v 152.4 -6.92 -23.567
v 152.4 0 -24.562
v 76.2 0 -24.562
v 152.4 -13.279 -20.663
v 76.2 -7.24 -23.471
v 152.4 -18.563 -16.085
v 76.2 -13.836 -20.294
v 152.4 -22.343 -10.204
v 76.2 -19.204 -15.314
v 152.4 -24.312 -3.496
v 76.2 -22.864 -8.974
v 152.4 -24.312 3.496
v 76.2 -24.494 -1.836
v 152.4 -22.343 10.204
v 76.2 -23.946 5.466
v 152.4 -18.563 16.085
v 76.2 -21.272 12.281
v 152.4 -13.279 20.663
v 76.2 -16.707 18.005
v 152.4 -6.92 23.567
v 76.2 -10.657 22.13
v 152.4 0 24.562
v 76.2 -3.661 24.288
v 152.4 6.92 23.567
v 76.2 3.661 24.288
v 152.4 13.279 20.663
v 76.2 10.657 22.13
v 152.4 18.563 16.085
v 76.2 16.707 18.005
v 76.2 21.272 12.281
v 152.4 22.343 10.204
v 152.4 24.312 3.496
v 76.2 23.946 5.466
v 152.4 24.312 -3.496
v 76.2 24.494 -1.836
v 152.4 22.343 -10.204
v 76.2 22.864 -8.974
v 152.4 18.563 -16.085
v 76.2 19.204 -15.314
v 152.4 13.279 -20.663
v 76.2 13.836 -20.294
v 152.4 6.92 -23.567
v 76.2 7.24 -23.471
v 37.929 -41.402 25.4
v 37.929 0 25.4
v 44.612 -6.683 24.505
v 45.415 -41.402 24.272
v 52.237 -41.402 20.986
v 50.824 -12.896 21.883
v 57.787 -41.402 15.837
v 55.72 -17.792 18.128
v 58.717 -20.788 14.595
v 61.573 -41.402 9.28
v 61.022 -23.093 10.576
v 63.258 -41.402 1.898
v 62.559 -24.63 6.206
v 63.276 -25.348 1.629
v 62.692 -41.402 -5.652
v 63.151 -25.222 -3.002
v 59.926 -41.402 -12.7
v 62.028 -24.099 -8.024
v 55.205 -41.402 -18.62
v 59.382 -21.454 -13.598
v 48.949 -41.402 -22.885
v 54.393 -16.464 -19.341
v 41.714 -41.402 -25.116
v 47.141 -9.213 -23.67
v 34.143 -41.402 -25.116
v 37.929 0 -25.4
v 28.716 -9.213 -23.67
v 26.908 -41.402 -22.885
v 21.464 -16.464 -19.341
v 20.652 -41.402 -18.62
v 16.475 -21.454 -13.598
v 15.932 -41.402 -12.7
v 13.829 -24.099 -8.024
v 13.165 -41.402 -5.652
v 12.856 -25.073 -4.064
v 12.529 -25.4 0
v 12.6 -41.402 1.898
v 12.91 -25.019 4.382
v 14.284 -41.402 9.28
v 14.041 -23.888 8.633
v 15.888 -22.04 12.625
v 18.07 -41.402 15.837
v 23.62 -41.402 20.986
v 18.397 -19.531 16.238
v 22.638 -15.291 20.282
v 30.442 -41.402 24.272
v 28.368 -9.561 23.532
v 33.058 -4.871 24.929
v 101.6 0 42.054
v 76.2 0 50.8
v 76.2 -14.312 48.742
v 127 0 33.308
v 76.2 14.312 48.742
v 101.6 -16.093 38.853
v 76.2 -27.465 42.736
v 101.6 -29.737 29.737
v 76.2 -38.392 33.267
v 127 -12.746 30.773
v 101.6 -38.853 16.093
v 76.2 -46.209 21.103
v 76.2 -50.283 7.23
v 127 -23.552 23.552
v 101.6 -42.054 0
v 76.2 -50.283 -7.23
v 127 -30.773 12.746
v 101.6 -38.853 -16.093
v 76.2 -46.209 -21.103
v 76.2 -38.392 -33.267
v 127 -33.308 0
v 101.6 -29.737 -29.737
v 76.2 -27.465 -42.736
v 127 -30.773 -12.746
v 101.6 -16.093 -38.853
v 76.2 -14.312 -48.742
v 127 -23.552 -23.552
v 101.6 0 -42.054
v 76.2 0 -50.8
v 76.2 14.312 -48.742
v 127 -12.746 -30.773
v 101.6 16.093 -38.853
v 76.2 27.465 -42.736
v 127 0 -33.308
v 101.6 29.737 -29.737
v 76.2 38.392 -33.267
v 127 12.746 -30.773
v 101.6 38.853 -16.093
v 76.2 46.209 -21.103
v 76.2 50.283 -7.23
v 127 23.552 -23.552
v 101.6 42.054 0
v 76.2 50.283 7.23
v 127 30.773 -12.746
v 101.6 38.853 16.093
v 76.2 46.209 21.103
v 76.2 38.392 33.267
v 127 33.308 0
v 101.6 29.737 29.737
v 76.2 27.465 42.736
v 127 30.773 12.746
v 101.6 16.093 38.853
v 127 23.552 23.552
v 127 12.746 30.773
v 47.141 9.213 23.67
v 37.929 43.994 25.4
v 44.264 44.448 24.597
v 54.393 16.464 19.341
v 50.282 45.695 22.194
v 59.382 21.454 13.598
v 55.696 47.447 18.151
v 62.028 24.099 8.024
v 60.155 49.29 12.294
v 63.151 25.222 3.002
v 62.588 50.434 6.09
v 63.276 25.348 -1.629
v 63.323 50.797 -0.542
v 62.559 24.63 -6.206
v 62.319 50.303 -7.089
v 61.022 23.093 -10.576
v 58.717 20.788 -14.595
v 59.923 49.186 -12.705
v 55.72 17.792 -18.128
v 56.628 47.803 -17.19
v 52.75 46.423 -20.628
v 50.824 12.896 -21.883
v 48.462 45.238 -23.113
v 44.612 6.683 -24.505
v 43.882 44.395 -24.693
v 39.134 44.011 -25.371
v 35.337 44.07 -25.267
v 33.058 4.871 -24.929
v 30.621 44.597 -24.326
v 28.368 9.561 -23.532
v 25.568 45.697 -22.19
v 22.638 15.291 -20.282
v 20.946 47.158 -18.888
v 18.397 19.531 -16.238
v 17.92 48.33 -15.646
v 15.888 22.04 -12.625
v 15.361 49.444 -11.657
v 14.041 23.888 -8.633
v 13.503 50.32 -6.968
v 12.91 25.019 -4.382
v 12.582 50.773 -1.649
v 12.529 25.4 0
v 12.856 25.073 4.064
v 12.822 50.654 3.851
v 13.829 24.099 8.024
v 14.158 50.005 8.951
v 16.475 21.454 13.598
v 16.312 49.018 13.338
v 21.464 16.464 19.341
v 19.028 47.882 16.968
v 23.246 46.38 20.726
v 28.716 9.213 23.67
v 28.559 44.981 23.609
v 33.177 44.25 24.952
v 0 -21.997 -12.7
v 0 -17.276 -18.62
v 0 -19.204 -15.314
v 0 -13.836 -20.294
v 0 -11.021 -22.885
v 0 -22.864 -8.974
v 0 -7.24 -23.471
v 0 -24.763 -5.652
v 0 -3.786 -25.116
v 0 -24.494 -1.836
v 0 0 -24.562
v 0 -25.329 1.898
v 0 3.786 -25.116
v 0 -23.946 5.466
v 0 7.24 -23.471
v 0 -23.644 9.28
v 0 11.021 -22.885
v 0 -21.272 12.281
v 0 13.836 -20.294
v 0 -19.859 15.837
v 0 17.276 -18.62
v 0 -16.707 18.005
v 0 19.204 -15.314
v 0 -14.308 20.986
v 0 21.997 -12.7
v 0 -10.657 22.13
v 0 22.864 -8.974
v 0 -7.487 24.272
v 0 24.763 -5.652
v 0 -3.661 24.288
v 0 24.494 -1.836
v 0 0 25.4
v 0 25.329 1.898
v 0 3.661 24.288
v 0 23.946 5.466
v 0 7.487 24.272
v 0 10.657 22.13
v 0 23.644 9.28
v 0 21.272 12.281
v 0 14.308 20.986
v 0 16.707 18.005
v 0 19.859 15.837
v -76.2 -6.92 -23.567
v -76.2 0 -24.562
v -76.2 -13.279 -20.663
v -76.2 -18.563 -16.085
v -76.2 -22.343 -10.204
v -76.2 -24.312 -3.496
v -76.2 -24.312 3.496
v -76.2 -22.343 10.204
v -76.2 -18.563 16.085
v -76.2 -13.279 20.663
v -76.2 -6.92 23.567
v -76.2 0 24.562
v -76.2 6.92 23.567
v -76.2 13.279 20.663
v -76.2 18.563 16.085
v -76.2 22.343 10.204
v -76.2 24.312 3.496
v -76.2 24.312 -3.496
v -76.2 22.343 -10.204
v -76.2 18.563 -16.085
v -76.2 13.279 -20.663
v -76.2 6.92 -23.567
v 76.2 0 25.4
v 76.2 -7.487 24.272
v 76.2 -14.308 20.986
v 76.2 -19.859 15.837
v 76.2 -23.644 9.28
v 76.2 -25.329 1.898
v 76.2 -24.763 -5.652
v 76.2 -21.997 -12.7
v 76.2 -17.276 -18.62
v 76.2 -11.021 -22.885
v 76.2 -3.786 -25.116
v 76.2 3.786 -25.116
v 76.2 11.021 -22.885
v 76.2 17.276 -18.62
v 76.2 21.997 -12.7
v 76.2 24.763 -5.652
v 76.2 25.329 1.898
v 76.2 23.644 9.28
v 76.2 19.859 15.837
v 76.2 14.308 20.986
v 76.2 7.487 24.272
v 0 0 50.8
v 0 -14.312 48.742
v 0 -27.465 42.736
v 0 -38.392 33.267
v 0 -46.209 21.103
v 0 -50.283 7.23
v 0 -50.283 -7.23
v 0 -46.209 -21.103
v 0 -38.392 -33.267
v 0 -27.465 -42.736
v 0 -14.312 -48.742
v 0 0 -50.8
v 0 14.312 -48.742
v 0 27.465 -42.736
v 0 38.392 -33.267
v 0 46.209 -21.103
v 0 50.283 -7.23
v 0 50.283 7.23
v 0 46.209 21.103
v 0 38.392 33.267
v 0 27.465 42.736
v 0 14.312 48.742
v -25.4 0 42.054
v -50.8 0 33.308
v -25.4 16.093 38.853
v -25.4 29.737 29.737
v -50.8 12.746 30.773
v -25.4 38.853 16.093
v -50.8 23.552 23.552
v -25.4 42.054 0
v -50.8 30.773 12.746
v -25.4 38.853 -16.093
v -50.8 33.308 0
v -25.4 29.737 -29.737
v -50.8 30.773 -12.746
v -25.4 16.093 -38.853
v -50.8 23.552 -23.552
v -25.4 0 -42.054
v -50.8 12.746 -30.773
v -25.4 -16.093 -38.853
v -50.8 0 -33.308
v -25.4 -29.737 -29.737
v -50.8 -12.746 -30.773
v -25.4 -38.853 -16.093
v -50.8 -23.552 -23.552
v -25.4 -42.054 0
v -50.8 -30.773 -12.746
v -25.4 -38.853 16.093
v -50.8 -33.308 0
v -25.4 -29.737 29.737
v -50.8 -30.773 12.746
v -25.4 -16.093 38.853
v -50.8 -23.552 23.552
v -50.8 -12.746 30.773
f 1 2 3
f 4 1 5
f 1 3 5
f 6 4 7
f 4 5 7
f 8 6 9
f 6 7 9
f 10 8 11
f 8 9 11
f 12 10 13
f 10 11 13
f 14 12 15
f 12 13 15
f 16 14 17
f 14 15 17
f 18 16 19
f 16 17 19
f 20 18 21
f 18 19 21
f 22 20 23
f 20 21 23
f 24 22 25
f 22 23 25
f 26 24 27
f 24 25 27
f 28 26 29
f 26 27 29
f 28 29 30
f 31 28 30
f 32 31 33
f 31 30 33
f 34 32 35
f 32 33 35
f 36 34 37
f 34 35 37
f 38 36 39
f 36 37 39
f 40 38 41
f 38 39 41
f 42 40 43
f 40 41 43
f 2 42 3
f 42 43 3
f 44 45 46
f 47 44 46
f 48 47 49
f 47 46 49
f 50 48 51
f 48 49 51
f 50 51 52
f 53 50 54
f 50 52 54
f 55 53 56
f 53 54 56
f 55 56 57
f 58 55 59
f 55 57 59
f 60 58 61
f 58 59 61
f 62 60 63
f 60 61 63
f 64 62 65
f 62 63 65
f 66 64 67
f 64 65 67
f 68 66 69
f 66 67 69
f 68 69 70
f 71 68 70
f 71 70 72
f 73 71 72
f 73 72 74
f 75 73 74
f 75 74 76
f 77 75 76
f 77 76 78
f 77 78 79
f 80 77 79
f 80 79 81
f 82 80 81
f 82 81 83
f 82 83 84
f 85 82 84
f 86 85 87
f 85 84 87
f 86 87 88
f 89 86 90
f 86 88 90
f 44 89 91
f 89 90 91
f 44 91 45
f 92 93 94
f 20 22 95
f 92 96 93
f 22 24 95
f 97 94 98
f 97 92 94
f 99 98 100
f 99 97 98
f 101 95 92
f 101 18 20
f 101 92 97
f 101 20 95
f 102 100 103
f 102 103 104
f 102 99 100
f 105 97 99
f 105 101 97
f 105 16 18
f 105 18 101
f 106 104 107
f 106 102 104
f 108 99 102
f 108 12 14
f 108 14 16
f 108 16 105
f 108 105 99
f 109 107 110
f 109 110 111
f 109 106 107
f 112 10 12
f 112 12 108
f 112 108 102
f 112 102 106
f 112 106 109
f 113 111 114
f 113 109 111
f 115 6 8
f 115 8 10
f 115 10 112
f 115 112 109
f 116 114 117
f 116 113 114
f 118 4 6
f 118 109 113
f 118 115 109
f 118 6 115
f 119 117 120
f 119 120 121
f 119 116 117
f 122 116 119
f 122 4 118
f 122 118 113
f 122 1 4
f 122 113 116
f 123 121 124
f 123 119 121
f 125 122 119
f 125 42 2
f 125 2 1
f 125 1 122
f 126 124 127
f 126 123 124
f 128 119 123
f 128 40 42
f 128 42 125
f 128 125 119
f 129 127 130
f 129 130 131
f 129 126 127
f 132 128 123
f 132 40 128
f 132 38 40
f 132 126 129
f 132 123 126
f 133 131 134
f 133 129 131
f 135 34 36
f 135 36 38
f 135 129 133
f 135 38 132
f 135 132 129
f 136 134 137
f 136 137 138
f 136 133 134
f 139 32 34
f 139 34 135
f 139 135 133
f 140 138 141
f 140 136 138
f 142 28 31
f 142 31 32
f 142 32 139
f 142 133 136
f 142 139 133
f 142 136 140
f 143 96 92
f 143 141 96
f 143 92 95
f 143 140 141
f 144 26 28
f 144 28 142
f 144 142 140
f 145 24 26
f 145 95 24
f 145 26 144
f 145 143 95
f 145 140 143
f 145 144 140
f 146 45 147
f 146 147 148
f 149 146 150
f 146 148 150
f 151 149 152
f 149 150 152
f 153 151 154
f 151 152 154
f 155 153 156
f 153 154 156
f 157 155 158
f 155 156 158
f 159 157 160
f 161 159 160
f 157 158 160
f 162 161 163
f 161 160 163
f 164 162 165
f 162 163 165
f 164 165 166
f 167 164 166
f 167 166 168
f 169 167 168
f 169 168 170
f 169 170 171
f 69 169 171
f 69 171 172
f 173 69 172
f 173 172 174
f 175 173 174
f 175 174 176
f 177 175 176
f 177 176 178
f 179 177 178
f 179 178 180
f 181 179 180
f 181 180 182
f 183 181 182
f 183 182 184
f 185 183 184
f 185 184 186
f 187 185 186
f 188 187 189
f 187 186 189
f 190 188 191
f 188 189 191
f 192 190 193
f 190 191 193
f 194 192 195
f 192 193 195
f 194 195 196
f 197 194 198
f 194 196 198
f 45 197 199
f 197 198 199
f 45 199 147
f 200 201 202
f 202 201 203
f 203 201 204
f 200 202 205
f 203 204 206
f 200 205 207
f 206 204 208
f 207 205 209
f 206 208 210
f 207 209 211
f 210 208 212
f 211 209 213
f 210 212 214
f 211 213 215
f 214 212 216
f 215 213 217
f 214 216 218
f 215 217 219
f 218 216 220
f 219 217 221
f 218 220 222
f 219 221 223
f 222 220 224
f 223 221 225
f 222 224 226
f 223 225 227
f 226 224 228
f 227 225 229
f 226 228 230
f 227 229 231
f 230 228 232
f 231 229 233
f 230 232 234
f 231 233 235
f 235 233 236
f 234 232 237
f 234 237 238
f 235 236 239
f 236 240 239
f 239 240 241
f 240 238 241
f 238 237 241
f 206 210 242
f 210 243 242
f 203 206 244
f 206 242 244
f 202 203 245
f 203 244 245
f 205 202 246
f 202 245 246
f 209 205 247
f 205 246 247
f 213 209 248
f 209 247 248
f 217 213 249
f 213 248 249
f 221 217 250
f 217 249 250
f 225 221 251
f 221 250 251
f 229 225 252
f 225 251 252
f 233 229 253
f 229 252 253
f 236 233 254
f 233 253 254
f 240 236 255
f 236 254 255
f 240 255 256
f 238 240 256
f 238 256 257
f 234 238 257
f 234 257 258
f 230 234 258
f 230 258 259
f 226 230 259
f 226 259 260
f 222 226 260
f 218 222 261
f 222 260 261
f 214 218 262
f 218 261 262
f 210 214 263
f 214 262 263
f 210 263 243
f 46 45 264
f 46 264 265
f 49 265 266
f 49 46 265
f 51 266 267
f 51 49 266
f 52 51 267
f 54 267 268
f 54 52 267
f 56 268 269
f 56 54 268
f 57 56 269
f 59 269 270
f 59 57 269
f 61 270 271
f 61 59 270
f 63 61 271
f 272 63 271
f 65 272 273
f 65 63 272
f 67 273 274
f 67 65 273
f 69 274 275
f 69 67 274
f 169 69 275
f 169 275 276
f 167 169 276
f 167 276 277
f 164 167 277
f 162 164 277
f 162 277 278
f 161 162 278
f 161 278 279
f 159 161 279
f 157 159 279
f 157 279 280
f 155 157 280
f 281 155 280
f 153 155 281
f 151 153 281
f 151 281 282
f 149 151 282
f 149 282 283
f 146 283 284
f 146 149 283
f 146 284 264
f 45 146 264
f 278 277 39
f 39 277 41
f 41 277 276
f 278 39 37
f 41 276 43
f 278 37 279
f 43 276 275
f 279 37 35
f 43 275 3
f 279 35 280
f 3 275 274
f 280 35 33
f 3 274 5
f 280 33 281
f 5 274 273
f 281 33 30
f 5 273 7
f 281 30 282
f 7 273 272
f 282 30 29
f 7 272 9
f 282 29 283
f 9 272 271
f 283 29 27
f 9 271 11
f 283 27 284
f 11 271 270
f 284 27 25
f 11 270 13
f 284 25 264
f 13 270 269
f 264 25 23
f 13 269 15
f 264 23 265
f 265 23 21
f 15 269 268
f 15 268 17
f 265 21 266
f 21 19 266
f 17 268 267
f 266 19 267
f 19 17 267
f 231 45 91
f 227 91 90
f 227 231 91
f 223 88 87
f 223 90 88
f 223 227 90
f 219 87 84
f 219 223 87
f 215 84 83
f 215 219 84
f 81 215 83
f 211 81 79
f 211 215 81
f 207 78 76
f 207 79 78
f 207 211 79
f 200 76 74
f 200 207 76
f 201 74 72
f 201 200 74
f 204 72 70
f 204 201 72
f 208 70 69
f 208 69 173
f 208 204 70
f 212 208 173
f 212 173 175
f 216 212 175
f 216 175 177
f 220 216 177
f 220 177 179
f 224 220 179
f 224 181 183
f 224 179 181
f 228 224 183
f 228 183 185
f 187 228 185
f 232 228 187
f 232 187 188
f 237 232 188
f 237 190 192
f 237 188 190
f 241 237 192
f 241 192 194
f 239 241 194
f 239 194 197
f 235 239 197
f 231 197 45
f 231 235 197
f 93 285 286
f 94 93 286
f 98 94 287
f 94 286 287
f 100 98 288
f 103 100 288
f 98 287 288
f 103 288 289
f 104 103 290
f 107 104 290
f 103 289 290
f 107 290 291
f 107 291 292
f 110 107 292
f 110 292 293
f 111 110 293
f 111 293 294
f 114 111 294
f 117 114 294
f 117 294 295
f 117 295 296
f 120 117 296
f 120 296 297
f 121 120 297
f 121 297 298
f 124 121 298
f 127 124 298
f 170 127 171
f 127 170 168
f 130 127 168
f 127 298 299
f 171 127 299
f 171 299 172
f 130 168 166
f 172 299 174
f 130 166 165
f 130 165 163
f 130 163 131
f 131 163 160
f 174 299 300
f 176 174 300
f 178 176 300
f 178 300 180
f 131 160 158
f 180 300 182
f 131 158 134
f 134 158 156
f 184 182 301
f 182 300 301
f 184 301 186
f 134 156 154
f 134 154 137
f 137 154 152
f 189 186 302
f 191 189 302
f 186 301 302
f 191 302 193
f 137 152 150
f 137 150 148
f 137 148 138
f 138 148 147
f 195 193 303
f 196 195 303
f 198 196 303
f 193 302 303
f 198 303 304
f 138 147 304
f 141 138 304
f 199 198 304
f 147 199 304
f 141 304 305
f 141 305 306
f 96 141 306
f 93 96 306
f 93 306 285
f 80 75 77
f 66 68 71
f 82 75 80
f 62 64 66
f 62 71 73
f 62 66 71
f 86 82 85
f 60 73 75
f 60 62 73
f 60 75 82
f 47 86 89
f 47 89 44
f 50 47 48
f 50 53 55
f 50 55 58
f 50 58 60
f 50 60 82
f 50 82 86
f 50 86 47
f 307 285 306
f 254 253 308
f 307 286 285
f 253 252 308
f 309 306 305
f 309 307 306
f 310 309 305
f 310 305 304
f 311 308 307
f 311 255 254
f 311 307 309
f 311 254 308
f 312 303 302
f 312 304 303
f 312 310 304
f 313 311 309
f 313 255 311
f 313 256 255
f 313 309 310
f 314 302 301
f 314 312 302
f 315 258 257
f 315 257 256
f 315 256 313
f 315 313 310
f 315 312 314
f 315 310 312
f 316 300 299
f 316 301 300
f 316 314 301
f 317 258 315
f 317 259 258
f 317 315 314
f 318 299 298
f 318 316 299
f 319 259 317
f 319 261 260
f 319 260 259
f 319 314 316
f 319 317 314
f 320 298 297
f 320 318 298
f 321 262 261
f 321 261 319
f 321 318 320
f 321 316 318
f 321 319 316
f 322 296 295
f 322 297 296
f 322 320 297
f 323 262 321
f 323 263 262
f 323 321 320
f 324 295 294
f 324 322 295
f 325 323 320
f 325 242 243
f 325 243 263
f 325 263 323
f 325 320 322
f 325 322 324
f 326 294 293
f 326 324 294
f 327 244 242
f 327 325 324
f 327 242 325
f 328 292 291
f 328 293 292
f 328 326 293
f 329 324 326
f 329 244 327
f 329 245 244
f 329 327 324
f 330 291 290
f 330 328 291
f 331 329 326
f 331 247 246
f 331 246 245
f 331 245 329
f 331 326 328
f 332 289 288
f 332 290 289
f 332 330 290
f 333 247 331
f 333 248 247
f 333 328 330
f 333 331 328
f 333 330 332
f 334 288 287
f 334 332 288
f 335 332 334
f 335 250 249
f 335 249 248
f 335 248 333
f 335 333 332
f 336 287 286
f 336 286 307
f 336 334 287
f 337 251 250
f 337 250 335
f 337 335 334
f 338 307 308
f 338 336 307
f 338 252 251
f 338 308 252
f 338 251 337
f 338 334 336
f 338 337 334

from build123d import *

# Parameters (mm, degrees)
SKETCH1_R           = 50.8
SKETCH1_R_2         = 25.4
BOSS_EXTRUDE1_DEPTH = 76.2
SKETCH2_R           = 50.8
BOSS_EXTRUDE2_DEPTH = 76.2
BOSS_EXTRUDE2_TAPER = 19
SKETCH3_R           = 50.8
BOSS_EXTRUDE3_DEPTH = 76.2
BOSS_EXTRUDE3_TAPER = 19
SKETCH4_R           = 24.562235867
CUT_EXTRUDE1_DEPTH  = 270.002
SKETCH5_R           = 25.4
CUT_EXTRUDE2_DEPTH  = 295.402


with BuildPart() as part:
    # Sketch1 → Boss-Extrude1 (new body)
    with BuildSketch(Plane(origin=(0, 0, 0), x_dir=(0, 0, -1), z_dir=(1, 0, 0))):
        with Locations(Location((0, 0, 0), (0, 0, 180))):
            Circle(SKETCH1_R)
        with Locations(Location((0, 0, 0), (0, 0, 180))):
            Circle(SKETCH1_R_2, mode=Mode.SUBTRACT)
    extrude(amount=BOSS_EXTRUDE1_DEPTH)

    # Sketch2 → Boss-Extrude2 (add)
    with BuildSketch(Plane.ZY):
        Circle(SKETCH2_R)
    extrude(amount=BOSS_EXTRUDE2_DEPTH, taper=BOSS_EXTRUDE2_TAPER)

    # Sketch3 → Boss-Extrude3 (add)
    with BuildSketch(Plane(origin=(76.2, 0, 0), x_dir=(0, 0, -1), z_dir=(1, 0, 0))):
        with Locations(Location((0, 0, 0), (0, 0, 180))):
            Circle(SKETCH3_R)
    extrude(amount=BOSS_EXTRUDE3_DEPTH, taper=BOSS_EXTRUDE3_TAPER)

    # Sketch4 → Cut-Extrude1 (cut)
    with BuildSketch(Plane.ZY.offset(76.2)):
        with Locations(Location((0, 0, 0), (0, 0, 180))):
            Circle(SKETCH4_R)
    extrude(amount=-CUT_EXTRUDE1_DEPTH, mode=Mode.SUBTRACT)

    # Sketch5 → Cut-Extrude2 (cut)
    with BuildSketch(Plane(origin=(0, 254, 0), x_dir=(1, 0, 0), z_dir=(0, 1, 0))):
        with Locations(Location((37.928629542, 0, 0), (0, 0, 270))):
            Circle(SKETCH5_R)
    extrude(amount=-CUT_EXTRUDE2_DEPTH, mode=Mode.SUBTRACT)


solid = part.part
